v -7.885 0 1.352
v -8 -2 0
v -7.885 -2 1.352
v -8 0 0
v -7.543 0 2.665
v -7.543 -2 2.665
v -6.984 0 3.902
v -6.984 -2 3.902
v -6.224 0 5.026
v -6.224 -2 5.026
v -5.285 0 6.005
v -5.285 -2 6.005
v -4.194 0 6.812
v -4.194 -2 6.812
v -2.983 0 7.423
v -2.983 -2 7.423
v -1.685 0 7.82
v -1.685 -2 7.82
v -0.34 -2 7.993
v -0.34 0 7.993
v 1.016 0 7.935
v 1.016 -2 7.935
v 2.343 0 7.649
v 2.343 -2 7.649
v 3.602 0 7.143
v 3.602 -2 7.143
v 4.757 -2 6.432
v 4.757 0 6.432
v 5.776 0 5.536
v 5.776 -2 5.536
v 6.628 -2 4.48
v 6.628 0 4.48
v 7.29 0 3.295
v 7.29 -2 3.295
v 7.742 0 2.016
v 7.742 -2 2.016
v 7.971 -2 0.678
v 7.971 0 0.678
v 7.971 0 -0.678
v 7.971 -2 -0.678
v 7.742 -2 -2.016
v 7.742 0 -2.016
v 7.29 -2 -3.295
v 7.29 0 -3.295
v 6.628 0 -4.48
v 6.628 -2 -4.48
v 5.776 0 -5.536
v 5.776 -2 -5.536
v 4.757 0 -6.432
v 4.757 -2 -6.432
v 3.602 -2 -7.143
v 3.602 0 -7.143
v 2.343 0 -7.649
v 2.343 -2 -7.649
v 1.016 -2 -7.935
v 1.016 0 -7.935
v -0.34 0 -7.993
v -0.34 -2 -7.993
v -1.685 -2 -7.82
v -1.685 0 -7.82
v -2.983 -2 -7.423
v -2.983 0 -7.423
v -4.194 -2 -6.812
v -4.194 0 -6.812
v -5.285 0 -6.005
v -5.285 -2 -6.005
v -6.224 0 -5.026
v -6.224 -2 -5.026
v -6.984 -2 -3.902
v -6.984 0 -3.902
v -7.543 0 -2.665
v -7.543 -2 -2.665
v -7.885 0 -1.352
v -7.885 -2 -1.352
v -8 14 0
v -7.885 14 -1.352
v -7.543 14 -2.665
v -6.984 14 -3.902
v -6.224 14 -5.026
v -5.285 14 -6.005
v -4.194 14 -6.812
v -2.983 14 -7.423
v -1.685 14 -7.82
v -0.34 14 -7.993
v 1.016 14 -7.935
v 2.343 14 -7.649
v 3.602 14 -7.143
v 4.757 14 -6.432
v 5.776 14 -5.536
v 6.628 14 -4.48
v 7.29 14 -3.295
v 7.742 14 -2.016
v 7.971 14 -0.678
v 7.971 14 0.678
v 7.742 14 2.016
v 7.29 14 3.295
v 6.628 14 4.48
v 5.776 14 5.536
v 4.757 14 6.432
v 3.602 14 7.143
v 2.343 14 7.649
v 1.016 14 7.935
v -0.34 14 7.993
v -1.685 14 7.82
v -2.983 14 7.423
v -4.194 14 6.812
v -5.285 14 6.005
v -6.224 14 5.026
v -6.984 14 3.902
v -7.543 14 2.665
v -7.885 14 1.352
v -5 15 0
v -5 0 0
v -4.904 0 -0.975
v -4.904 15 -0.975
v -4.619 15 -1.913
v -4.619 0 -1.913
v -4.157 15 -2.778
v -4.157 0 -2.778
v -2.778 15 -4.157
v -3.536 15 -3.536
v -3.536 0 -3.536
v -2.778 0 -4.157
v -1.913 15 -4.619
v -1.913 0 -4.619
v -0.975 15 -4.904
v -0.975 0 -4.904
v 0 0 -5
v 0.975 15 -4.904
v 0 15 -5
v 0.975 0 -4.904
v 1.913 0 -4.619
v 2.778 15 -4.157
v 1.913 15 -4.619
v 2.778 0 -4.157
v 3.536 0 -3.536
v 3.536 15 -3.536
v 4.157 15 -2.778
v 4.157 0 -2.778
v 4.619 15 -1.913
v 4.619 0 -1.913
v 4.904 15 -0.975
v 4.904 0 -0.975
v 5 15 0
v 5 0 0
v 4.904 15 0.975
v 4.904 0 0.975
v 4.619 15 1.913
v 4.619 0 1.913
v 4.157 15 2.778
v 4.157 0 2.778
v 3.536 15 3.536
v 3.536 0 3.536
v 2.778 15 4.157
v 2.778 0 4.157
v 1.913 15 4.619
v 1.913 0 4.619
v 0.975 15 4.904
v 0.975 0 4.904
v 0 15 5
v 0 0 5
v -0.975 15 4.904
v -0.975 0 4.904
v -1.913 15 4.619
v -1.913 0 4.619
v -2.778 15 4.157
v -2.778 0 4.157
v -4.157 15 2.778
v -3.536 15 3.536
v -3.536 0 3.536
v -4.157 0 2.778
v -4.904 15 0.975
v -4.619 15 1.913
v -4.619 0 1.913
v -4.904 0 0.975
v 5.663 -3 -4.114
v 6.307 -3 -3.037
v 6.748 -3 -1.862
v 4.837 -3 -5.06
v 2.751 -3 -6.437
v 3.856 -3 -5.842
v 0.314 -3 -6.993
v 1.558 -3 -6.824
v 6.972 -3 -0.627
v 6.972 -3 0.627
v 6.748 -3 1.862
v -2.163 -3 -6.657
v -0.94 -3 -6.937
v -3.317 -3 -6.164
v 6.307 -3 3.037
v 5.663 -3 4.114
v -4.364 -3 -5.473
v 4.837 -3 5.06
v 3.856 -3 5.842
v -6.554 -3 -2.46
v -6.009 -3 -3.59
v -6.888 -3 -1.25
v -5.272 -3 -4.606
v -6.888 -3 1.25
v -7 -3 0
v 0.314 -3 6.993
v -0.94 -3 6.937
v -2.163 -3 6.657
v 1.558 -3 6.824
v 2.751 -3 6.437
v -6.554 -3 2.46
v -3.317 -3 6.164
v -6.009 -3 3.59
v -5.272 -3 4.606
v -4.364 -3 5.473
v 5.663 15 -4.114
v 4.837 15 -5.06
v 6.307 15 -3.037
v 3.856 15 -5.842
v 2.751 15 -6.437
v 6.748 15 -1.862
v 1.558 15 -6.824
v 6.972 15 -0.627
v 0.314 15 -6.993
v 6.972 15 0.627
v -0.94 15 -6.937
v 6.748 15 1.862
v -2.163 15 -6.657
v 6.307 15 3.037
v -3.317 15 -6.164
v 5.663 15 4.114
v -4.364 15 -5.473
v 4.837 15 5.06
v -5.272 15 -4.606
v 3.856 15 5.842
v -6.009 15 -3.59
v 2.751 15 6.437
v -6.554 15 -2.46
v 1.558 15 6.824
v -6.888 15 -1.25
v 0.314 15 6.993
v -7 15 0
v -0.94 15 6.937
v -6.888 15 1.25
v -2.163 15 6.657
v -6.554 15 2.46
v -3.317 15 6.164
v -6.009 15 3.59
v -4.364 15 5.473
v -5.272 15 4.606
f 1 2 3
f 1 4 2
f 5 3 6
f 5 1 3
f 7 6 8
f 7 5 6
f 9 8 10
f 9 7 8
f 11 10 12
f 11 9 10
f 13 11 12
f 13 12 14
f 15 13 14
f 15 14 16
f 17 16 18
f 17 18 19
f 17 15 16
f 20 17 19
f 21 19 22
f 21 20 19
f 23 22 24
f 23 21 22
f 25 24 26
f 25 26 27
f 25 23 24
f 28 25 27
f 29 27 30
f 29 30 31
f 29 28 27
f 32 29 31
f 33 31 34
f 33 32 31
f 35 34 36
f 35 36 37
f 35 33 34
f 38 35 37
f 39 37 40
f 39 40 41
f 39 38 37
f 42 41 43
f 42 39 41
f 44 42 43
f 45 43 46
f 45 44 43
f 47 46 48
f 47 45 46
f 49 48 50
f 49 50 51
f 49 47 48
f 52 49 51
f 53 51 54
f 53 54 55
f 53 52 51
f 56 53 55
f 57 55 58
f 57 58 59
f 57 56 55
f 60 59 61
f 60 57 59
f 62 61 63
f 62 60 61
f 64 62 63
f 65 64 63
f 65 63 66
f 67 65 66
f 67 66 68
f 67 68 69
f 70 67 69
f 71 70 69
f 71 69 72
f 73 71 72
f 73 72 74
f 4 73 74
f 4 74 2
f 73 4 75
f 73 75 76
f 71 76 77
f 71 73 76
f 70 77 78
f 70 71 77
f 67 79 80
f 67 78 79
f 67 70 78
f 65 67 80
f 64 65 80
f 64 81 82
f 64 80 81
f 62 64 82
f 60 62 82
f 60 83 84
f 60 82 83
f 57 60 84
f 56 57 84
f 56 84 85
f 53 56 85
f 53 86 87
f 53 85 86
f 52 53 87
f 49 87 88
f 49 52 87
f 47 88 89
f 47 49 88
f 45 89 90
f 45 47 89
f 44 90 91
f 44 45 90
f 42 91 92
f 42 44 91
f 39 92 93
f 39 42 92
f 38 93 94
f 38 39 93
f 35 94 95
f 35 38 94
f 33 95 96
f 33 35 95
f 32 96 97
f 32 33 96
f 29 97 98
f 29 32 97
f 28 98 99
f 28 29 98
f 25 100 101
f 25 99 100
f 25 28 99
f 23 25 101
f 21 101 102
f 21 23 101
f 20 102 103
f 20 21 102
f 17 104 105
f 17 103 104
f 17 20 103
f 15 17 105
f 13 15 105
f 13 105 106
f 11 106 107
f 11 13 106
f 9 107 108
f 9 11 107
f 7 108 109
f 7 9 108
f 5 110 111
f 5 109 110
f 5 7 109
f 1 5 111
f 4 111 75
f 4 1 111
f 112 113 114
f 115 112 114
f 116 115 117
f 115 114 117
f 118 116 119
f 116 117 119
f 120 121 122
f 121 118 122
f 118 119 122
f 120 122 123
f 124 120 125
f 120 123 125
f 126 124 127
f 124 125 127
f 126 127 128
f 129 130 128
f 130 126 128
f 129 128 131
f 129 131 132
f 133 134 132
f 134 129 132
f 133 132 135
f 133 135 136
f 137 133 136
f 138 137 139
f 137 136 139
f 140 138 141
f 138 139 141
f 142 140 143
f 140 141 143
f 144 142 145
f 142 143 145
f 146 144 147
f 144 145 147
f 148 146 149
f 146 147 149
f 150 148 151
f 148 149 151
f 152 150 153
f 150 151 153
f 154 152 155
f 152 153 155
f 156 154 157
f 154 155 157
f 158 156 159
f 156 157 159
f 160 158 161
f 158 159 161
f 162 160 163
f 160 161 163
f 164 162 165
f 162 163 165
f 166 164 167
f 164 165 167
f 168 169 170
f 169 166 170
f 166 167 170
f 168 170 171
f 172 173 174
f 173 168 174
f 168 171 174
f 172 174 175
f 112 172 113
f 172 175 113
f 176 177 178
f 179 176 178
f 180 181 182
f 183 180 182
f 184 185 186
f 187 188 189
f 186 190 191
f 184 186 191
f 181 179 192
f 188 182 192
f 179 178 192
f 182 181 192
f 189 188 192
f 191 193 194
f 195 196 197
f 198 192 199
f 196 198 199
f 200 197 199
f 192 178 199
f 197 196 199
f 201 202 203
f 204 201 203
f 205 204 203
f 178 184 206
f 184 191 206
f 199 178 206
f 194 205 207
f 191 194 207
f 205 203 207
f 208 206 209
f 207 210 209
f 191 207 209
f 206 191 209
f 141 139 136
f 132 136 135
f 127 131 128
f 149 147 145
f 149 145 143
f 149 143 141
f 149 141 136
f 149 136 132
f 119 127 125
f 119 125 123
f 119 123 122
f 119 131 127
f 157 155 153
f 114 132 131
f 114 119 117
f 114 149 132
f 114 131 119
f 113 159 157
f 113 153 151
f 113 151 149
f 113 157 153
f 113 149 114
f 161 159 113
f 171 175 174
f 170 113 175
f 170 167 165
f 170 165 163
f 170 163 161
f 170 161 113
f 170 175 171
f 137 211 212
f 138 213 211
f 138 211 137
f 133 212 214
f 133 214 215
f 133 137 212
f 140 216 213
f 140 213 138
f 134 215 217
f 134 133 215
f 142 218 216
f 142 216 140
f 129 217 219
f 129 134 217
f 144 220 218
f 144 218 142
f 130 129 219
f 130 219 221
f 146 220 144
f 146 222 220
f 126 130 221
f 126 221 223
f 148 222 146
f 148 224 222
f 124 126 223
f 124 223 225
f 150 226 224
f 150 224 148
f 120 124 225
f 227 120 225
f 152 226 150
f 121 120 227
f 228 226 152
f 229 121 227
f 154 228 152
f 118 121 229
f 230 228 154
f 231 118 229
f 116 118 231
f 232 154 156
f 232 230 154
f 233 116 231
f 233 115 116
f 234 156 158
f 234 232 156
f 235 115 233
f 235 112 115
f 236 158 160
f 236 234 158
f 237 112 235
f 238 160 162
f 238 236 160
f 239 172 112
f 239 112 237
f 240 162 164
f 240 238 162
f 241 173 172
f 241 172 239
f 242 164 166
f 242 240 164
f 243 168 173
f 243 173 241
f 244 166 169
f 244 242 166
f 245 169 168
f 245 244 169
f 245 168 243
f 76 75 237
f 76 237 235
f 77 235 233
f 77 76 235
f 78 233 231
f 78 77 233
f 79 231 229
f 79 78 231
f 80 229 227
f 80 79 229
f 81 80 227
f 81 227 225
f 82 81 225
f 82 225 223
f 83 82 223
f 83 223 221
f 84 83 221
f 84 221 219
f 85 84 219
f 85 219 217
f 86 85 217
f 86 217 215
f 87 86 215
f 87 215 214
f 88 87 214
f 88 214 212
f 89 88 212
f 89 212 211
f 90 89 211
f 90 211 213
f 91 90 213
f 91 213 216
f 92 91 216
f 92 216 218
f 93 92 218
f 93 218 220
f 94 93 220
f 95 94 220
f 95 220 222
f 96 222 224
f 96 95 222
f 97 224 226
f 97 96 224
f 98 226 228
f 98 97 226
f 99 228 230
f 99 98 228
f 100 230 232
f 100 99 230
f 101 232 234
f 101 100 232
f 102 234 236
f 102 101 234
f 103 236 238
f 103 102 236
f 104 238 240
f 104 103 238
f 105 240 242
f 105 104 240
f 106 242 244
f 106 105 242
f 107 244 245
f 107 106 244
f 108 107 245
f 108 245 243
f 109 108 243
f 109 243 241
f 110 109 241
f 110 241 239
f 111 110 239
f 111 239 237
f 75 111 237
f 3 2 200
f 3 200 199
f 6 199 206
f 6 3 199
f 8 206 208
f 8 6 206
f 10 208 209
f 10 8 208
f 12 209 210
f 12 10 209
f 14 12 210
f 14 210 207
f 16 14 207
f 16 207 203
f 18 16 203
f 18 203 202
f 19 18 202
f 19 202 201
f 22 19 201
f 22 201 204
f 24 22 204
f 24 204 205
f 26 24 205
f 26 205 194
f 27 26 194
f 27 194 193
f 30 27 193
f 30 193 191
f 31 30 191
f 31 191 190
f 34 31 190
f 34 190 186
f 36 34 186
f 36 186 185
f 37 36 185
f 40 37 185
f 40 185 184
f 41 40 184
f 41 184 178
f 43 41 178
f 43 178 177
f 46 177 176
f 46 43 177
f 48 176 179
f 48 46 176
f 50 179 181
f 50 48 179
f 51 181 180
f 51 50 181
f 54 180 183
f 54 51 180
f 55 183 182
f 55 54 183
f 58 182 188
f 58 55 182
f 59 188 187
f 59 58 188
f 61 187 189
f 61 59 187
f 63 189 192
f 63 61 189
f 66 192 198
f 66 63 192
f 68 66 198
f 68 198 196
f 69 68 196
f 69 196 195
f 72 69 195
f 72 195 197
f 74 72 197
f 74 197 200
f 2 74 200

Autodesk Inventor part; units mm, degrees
ref_plane "YZ Plane" through (0, 0, 0) normal (1, 0, 0) x (0, 1, 0)
ref_plane "XZ Plane" through (0, 0, 0) normal (0, 1, 0) x (-1, 0, 0)
ref_plane "XY Plane" through (0, 0, 0) normal (0, 0, 1) x (1, 0, 0)
sketch "Sketch1" plane through (0, 0, 0) normal (0, 1, 0) x (-1, 0, 0)
  circle A0 centre (0, 0) radius 5
  circle A1 centre (0, 0) radius 8
  dimension "d0" = 10
  dimension "d1" = 16
extrude "Extrusion1" add sketch "Sketch1" against normal blind 3 contours A0 | A1
extrude "Extrusion2" add sketch "Sketch1" along normal blind 15
chamfer "Chamfer1" distance 1 angle 45 2 edges at (8, 15, 0) (8, -3, 0)
properties part number "3DP_ASA_Rod_End_Cap"
